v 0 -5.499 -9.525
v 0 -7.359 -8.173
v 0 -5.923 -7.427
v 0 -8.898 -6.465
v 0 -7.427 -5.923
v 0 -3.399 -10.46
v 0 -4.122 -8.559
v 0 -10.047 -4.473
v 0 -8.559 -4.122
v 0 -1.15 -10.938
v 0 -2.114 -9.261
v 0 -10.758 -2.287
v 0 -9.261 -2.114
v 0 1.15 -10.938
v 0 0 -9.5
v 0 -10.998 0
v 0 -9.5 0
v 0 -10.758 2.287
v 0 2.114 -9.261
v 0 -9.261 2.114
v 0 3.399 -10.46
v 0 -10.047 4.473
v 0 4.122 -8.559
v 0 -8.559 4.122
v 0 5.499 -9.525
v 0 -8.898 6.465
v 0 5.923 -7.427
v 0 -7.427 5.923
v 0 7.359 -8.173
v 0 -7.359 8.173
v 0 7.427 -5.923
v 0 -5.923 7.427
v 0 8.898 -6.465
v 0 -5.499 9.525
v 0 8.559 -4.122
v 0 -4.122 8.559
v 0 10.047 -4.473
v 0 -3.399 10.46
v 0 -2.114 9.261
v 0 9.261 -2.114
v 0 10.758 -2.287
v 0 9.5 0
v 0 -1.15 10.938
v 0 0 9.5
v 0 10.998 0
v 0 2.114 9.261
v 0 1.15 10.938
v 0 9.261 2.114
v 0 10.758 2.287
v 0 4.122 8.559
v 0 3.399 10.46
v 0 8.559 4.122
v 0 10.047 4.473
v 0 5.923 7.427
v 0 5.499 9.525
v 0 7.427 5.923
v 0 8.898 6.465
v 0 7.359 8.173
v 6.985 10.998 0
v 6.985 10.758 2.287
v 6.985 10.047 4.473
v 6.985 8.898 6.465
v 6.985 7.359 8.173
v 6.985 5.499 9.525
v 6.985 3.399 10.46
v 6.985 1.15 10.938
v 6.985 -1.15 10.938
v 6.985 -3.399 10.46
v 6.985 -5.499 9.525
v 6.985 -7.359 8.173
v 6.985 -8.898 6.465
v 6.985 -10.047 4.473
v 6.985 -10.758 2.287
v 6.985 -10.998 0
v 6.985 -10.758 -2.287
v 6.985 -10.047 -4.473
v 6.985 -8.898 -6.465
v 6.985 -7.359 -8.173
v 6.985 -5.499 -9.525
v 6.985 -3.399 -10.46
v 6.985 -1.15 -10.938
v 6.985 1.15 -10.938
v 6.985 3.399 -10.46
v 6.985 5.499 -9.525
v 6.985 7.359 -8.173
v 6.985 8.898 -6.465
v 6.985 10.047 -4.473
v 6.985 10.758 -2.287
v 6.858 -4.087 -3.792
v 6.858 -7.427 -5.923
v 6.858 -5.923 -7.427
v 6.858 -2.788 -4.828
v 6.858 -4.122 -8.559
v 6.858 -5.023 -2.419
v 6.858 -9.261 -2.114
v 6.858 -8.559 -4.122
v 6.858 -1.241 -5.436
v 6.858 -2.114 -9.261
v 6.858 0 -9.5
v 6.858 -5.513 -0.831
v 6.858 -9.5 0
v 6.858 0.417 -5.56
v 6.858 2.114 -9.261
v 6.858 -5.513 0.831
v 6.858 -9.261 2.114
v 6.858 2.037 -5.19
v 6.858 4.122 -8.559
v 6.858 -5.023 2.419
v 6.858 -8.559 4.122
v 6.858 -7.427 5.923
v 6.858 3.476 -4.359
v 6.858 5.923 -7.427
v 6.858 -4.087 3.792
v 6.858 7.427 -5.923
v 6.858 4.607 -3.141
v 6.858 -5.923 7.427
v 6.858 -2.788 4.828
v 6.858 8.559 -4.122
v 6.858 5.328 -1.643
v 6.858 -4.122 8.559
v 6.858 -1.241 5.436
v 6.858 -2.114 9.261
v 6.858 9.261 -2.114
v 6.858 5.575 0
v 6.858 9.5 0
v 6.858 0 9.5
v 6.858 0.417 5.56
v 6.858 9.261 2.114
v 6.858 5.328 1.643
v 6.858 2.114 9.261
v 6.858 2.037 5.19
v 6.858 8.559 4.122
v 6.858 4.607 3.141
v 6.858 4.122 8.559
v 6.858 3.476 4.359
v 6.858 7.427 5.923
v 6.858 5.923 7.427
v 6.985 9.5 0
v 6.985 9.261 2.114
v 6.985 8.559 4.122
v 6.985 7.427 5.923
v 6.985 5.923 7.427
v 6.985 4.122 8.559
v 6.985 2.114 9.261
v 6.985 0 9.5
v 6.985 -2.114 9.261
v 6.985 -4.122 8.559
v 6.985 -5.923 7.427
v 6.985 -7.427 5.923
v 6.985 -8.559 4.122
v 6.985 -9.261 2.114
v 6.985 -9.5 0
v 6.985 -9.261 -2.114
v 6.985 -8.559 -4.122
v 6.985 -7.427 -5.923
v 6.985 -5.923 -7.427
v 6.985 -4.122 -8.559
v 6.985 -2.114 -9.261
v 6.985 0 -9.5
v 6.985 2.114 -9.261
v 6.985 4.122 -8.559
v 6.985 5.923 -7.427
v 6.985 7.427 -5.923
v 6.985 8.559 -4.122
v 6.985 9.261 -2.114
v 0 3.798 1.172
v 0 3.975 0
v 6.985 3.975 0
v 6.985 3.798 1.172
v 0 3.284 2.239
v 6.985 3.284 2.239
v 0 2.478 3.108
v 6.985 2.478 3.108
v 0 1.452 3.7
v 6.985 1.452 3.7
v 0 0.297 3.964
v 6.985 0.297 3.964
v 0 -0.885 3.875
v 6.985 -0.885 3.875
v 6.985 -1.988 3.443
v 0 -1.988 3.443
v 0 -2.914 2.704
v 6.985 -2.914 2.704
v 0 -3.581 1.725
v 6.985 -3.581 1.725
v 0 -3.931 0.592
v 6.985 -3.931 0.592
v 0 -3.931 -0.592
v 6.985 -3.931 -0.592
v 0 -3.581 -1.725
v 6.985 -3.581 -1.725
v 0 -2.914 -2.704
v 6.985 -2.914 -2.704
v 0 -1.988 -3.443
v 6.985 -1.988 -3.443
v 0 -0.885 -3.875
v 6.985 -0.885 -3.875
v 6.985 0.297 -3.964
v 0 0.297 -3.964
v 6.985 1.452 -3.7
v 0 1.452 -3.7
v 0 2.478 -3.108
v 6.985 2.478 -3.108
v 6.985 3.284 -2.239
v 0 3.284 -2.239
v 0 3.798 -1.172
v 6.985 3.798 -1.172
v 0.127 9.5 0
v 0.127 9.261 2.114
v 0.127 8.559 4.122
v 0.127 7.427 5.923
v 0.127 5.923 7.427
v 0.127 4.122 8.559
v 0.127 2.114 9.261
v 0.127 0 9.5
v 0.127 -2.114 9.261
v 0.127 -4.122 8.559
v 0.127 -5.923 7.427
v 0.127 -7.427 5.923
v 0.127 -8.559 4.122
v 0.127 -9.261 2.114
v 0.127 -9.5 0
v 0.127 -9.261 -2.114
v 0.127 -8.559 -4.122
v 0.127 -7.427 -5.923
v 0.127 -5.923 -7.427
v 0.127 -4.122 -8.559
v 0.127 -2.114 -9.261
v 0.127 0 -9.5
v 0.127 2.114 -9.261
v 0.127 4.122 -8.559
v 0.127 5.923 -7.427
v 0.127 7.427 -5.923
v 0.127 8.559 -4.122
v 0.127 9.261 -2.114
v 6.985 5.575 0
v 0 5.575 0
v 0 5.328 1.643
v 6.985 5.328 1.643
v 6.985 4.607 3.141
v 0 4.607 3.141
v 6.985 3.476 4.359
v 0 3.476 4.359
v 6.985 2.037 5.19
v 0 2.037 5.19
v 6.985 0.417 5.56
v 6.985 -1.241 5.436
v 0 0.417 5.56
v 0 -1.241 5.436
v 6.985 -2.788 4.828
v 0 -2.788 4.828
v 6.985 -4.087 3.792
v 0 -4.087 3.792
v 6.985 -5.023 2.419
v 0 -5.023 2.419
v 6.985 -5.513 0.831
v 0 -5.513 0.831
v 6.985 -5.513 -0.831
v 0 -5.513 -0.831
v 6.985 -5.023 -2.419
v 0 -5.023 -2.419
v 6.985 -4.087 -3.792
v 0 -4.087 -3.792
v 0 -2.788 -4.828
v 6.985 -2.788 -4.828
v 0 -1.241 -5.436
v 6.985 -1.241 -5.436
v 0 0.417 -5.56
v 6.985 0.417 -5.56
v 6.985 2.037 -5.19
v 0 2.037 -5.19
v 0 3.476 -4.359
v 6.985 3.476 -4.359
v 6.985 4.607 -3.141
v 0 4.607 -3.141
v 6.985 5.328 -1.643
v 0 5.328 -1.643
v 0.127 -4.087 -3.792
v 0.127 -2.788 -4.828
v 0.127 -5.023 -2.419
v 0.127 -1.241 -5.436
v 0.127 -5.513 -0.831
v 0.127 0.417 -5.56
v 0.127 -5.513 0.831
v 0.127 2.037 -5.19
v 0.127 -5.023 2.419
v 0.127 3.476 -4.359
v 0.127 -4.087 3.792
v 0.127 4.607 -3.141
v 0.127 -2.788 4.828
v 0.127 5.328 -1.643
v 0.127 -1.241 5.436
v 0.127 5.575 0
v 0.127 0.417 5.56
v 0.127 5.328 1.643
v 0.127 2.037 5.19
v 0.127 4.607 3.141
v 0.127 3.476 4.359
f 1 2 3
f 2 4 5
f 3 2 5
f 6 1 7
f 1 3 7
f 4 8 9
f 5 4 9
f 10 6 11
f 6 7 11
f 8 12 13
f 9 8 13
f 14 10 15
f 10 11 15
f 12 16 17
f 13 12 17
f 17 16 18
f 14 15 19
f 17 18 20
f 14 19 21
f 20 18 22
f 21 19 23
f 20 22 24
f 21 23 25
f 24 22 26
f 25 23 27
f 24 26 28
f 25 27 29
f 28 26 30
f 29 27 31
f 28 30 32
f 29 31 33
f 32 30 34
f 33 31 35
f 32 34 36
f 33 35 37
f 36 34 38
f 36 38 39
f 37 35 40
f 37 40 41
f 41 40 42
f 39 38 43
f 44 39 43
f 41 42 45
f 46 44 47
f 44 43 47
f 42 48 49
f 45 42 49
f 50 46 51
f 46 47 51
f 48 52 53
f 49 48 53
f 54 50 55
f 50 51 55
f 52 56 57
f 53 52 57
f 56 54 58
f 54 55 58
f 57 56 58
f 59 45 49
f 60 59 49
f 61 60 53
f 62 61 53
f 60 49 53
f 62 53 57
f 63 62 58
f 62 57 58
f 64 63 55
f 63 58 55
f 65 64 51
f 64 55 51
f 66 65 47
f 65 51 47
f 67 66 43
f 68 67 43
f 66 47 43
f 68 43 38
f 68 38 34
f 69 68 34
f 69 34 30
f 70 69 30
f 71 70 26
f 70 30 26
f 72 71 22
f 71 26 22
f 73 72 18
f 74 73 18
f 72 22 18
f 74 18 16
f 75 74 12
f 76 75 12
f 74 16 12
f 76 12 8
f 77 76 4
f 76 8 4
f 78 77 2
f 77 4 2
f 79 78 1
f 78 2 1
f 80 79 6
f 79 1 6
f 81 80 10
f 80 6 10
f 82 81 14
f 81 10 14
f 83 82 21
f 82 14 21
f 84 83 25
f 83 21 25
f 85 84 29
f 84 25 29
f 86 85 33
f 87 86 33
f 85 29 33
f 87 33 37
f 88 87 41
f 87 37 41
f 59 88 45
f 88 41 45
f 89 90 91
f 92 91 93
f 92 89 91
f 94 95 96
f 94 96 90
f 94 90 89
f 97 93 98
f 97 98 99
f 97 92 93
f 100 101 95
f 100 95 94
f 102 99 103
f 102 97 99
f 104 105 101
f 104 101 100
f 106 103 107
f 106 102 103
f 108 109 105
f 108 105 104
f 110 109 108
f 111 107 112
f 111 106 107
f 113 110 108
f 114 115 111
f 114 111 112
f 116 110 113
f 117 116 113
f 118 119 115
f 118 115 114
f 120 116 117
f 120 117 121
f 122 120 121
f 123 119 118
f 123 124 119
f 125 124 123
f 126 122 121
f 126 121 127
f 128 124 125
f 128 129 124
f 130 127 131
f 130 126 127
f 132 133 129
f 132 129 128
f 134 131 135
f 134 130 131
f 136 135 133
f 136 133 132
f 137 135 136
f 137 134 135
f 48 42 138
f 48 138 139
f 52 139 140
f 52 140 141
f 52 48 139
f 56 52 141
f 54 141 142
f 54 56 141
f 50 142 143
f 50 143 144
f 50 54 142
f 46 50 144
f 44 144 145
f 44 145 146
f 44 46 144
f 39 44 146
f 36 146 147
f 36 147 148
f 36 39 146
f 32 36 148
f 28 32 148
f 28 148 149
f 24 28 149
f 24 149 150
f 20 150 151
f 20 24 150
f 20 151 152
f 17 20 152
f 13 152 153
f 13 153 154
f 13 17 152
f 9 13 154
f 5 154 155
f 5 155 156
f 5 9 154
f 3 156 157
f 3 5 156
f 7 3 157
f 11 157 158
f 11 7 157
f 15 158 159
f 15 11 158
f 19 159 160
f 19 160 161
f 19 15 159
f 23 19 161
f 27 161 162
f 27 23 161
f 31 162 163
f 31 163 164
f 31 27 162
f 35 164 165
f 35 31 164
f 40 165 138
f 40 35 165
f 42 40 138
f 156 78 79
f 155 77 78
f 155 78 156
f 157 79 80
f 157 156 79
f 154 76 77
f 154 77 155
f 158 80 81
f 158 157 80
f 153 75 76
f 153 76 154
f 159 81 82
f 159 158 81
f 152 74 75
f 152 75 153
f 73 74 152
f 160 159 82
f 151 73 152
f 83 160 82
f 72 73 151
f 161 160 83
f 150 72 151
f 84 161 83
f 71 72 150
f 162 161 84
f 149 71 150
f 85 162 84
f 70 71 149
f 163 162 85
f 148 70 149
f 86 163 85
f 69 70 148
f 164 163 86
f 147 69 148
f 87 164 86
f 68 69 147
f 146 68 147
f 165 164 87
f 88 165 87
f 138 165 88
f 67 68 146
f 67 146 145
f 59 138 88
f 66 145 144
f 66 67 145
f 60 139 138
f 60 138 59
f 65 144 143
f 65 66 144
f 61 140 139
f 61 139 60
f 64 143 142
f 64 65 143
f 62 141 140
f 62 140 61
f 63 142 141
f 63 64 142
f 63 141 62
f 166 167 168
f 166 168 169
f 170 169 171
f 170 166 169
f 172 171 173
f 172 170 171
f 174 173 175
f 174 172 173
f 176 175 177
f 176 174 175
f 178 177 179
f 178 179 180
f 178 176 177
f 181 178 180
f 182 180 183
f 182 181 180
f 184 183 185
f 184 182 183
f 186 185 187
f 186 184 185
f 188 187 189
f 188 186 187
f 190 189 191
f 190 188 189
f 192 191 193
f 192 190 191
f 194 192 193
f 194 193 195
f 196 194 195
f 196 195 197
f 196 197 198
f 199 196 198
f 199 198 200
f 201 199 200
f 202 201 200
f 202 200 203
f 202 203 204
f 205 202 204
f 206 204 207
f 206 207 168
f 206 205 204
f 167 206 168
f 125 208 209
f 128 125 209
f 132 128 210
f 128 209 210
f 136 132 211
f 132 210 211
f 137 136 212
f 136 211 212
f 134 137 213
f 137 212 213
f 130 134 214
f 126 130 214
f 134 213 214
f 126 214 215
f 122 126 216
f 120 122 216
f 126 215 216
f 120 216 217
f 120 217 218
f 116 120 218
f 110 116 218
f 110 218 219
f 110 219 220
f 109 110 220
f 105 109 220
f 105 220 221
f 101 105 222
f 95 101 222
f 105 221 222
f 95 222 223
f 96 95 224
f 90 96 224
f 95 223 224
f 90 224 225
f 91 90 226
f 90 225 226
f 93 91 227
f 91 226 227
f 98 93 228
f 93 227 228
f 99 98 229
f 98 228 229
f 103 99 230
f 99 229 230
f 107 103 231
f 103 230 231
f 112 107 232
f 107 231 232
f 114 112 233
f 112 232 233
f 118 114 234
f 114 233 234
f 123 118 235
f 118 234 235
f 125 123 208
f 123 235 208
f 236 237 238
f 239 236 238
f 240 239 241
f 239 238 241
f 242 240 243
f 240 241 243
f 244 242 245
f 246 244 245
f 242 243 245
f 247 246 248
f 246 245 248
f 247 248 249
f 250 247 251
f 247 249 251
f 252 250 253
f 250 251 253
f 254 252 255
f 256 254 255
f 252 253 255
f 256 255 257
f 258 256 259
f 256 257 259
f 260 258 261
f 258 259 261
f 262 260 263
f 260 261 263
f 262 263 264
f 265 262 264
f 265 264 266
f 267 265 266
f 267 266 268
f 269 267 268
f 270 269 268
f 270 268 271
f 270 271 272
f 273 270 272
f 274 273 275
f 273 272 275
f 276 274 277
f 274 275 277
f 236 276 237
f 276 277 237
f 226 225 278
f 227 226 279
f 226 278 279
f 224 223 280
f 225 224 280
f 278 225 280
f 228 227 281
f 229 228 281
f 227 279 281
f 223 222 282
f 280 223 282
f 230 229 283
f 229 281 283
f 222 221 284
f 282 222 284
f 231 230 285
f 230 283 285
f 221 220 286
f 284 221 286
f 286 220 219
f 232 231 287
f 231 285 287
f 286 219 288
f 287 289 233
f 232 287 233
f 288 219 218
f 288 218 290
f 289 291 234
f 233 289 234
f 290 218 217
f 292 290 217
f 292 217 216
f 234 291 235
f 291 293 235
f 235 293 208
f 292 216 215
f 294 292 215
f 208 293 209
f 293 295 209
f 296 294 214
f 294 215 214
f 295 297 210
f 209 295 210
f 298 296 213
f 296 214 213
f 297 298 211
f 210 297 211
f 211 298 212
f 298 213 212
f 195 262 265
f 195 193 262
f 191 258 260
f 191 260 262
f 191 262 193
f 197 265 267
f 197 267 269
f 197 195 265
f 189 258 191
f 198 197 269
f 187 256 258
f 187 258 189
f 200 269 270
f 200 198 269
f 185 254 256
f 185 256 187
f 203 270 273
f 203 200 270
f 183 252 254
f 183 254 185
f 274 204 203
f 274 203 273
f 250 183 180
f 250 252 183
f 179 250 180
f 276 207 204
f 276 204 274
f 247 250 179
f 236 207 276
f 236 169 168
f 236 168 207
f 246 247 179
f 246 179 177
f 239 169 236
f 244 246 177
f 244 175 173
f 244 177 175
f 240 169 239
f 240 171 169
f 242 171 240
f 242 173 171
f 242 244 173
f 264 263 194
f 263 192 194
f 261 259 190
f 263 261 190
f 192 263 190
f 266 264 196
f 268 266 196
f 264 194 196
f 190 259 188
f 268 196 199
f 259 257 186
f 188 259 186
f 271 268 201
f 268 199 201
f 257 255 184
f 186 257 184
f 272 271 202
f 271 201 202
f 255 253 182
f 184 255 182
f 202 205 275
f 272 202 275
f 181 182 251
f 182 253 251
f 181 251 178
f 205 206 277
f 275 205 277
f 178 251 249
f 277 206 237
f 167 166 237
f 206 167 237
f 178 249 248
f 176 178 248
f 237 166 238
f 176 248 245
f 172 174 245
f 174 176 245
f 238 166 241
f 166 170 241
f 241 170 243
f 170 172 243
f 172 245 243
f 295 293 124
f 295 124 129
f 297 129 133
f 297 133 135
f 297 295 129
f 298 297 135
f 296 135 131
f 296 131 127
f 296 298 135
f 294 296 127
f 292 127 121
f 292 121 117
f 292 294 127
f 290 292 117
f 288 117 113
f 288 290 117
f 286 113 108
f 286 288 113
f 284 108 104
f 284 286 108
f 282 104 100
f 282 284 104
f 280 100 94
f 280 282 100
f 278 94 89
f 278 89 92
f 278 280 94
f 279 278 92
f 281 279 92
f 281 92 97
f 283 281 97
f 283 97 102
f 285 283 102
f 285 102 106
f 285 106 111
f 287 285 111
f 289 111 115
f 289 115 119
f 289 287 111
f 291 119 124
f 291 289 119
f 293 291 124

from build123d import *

# Parameters (mm, degrees)
F0_R     = 5.5753
F0_R_2   = 3.9751
F1_DEPTH = 6.985
F0_R_3   = 10.9982
F0_R_4   = 9.4996
F2_START = 0.127
F2_DEPTH = 6.731


with BuildPart() as f1:
    # F0 (on Right) → F1 (new body)
    with BuildSketch(Plane.YZ):
        Circle(F0_R)
        Circle(F0_R_2, mode=Mode.SUBTRACT)
    extrude(amount=F1_DEPTH)


with BuildPart() as f1b:
    # F0 (on Right) → F1, piece 2 (new body)
    with BuildSketch(Plane.YZ):
        Circle(F0_R_3)
        Circle(F0_R_4, mode=Mode.SUBTRACT)
    extrude(amount=F1_DEPTH)


with BuildPart() as f2:
    # F0 (on Right) → F2 (new body)
    with BuildSketch(Plane.YZ.offset(F2_START)):
        Circle(F0_R_4)
        Circle(F0_R, mode=Mode.SUBTRACT)
    extrude(amount=F2_DEPTH)


solid = Compound([f1.part, f1b.part, f2.part])
